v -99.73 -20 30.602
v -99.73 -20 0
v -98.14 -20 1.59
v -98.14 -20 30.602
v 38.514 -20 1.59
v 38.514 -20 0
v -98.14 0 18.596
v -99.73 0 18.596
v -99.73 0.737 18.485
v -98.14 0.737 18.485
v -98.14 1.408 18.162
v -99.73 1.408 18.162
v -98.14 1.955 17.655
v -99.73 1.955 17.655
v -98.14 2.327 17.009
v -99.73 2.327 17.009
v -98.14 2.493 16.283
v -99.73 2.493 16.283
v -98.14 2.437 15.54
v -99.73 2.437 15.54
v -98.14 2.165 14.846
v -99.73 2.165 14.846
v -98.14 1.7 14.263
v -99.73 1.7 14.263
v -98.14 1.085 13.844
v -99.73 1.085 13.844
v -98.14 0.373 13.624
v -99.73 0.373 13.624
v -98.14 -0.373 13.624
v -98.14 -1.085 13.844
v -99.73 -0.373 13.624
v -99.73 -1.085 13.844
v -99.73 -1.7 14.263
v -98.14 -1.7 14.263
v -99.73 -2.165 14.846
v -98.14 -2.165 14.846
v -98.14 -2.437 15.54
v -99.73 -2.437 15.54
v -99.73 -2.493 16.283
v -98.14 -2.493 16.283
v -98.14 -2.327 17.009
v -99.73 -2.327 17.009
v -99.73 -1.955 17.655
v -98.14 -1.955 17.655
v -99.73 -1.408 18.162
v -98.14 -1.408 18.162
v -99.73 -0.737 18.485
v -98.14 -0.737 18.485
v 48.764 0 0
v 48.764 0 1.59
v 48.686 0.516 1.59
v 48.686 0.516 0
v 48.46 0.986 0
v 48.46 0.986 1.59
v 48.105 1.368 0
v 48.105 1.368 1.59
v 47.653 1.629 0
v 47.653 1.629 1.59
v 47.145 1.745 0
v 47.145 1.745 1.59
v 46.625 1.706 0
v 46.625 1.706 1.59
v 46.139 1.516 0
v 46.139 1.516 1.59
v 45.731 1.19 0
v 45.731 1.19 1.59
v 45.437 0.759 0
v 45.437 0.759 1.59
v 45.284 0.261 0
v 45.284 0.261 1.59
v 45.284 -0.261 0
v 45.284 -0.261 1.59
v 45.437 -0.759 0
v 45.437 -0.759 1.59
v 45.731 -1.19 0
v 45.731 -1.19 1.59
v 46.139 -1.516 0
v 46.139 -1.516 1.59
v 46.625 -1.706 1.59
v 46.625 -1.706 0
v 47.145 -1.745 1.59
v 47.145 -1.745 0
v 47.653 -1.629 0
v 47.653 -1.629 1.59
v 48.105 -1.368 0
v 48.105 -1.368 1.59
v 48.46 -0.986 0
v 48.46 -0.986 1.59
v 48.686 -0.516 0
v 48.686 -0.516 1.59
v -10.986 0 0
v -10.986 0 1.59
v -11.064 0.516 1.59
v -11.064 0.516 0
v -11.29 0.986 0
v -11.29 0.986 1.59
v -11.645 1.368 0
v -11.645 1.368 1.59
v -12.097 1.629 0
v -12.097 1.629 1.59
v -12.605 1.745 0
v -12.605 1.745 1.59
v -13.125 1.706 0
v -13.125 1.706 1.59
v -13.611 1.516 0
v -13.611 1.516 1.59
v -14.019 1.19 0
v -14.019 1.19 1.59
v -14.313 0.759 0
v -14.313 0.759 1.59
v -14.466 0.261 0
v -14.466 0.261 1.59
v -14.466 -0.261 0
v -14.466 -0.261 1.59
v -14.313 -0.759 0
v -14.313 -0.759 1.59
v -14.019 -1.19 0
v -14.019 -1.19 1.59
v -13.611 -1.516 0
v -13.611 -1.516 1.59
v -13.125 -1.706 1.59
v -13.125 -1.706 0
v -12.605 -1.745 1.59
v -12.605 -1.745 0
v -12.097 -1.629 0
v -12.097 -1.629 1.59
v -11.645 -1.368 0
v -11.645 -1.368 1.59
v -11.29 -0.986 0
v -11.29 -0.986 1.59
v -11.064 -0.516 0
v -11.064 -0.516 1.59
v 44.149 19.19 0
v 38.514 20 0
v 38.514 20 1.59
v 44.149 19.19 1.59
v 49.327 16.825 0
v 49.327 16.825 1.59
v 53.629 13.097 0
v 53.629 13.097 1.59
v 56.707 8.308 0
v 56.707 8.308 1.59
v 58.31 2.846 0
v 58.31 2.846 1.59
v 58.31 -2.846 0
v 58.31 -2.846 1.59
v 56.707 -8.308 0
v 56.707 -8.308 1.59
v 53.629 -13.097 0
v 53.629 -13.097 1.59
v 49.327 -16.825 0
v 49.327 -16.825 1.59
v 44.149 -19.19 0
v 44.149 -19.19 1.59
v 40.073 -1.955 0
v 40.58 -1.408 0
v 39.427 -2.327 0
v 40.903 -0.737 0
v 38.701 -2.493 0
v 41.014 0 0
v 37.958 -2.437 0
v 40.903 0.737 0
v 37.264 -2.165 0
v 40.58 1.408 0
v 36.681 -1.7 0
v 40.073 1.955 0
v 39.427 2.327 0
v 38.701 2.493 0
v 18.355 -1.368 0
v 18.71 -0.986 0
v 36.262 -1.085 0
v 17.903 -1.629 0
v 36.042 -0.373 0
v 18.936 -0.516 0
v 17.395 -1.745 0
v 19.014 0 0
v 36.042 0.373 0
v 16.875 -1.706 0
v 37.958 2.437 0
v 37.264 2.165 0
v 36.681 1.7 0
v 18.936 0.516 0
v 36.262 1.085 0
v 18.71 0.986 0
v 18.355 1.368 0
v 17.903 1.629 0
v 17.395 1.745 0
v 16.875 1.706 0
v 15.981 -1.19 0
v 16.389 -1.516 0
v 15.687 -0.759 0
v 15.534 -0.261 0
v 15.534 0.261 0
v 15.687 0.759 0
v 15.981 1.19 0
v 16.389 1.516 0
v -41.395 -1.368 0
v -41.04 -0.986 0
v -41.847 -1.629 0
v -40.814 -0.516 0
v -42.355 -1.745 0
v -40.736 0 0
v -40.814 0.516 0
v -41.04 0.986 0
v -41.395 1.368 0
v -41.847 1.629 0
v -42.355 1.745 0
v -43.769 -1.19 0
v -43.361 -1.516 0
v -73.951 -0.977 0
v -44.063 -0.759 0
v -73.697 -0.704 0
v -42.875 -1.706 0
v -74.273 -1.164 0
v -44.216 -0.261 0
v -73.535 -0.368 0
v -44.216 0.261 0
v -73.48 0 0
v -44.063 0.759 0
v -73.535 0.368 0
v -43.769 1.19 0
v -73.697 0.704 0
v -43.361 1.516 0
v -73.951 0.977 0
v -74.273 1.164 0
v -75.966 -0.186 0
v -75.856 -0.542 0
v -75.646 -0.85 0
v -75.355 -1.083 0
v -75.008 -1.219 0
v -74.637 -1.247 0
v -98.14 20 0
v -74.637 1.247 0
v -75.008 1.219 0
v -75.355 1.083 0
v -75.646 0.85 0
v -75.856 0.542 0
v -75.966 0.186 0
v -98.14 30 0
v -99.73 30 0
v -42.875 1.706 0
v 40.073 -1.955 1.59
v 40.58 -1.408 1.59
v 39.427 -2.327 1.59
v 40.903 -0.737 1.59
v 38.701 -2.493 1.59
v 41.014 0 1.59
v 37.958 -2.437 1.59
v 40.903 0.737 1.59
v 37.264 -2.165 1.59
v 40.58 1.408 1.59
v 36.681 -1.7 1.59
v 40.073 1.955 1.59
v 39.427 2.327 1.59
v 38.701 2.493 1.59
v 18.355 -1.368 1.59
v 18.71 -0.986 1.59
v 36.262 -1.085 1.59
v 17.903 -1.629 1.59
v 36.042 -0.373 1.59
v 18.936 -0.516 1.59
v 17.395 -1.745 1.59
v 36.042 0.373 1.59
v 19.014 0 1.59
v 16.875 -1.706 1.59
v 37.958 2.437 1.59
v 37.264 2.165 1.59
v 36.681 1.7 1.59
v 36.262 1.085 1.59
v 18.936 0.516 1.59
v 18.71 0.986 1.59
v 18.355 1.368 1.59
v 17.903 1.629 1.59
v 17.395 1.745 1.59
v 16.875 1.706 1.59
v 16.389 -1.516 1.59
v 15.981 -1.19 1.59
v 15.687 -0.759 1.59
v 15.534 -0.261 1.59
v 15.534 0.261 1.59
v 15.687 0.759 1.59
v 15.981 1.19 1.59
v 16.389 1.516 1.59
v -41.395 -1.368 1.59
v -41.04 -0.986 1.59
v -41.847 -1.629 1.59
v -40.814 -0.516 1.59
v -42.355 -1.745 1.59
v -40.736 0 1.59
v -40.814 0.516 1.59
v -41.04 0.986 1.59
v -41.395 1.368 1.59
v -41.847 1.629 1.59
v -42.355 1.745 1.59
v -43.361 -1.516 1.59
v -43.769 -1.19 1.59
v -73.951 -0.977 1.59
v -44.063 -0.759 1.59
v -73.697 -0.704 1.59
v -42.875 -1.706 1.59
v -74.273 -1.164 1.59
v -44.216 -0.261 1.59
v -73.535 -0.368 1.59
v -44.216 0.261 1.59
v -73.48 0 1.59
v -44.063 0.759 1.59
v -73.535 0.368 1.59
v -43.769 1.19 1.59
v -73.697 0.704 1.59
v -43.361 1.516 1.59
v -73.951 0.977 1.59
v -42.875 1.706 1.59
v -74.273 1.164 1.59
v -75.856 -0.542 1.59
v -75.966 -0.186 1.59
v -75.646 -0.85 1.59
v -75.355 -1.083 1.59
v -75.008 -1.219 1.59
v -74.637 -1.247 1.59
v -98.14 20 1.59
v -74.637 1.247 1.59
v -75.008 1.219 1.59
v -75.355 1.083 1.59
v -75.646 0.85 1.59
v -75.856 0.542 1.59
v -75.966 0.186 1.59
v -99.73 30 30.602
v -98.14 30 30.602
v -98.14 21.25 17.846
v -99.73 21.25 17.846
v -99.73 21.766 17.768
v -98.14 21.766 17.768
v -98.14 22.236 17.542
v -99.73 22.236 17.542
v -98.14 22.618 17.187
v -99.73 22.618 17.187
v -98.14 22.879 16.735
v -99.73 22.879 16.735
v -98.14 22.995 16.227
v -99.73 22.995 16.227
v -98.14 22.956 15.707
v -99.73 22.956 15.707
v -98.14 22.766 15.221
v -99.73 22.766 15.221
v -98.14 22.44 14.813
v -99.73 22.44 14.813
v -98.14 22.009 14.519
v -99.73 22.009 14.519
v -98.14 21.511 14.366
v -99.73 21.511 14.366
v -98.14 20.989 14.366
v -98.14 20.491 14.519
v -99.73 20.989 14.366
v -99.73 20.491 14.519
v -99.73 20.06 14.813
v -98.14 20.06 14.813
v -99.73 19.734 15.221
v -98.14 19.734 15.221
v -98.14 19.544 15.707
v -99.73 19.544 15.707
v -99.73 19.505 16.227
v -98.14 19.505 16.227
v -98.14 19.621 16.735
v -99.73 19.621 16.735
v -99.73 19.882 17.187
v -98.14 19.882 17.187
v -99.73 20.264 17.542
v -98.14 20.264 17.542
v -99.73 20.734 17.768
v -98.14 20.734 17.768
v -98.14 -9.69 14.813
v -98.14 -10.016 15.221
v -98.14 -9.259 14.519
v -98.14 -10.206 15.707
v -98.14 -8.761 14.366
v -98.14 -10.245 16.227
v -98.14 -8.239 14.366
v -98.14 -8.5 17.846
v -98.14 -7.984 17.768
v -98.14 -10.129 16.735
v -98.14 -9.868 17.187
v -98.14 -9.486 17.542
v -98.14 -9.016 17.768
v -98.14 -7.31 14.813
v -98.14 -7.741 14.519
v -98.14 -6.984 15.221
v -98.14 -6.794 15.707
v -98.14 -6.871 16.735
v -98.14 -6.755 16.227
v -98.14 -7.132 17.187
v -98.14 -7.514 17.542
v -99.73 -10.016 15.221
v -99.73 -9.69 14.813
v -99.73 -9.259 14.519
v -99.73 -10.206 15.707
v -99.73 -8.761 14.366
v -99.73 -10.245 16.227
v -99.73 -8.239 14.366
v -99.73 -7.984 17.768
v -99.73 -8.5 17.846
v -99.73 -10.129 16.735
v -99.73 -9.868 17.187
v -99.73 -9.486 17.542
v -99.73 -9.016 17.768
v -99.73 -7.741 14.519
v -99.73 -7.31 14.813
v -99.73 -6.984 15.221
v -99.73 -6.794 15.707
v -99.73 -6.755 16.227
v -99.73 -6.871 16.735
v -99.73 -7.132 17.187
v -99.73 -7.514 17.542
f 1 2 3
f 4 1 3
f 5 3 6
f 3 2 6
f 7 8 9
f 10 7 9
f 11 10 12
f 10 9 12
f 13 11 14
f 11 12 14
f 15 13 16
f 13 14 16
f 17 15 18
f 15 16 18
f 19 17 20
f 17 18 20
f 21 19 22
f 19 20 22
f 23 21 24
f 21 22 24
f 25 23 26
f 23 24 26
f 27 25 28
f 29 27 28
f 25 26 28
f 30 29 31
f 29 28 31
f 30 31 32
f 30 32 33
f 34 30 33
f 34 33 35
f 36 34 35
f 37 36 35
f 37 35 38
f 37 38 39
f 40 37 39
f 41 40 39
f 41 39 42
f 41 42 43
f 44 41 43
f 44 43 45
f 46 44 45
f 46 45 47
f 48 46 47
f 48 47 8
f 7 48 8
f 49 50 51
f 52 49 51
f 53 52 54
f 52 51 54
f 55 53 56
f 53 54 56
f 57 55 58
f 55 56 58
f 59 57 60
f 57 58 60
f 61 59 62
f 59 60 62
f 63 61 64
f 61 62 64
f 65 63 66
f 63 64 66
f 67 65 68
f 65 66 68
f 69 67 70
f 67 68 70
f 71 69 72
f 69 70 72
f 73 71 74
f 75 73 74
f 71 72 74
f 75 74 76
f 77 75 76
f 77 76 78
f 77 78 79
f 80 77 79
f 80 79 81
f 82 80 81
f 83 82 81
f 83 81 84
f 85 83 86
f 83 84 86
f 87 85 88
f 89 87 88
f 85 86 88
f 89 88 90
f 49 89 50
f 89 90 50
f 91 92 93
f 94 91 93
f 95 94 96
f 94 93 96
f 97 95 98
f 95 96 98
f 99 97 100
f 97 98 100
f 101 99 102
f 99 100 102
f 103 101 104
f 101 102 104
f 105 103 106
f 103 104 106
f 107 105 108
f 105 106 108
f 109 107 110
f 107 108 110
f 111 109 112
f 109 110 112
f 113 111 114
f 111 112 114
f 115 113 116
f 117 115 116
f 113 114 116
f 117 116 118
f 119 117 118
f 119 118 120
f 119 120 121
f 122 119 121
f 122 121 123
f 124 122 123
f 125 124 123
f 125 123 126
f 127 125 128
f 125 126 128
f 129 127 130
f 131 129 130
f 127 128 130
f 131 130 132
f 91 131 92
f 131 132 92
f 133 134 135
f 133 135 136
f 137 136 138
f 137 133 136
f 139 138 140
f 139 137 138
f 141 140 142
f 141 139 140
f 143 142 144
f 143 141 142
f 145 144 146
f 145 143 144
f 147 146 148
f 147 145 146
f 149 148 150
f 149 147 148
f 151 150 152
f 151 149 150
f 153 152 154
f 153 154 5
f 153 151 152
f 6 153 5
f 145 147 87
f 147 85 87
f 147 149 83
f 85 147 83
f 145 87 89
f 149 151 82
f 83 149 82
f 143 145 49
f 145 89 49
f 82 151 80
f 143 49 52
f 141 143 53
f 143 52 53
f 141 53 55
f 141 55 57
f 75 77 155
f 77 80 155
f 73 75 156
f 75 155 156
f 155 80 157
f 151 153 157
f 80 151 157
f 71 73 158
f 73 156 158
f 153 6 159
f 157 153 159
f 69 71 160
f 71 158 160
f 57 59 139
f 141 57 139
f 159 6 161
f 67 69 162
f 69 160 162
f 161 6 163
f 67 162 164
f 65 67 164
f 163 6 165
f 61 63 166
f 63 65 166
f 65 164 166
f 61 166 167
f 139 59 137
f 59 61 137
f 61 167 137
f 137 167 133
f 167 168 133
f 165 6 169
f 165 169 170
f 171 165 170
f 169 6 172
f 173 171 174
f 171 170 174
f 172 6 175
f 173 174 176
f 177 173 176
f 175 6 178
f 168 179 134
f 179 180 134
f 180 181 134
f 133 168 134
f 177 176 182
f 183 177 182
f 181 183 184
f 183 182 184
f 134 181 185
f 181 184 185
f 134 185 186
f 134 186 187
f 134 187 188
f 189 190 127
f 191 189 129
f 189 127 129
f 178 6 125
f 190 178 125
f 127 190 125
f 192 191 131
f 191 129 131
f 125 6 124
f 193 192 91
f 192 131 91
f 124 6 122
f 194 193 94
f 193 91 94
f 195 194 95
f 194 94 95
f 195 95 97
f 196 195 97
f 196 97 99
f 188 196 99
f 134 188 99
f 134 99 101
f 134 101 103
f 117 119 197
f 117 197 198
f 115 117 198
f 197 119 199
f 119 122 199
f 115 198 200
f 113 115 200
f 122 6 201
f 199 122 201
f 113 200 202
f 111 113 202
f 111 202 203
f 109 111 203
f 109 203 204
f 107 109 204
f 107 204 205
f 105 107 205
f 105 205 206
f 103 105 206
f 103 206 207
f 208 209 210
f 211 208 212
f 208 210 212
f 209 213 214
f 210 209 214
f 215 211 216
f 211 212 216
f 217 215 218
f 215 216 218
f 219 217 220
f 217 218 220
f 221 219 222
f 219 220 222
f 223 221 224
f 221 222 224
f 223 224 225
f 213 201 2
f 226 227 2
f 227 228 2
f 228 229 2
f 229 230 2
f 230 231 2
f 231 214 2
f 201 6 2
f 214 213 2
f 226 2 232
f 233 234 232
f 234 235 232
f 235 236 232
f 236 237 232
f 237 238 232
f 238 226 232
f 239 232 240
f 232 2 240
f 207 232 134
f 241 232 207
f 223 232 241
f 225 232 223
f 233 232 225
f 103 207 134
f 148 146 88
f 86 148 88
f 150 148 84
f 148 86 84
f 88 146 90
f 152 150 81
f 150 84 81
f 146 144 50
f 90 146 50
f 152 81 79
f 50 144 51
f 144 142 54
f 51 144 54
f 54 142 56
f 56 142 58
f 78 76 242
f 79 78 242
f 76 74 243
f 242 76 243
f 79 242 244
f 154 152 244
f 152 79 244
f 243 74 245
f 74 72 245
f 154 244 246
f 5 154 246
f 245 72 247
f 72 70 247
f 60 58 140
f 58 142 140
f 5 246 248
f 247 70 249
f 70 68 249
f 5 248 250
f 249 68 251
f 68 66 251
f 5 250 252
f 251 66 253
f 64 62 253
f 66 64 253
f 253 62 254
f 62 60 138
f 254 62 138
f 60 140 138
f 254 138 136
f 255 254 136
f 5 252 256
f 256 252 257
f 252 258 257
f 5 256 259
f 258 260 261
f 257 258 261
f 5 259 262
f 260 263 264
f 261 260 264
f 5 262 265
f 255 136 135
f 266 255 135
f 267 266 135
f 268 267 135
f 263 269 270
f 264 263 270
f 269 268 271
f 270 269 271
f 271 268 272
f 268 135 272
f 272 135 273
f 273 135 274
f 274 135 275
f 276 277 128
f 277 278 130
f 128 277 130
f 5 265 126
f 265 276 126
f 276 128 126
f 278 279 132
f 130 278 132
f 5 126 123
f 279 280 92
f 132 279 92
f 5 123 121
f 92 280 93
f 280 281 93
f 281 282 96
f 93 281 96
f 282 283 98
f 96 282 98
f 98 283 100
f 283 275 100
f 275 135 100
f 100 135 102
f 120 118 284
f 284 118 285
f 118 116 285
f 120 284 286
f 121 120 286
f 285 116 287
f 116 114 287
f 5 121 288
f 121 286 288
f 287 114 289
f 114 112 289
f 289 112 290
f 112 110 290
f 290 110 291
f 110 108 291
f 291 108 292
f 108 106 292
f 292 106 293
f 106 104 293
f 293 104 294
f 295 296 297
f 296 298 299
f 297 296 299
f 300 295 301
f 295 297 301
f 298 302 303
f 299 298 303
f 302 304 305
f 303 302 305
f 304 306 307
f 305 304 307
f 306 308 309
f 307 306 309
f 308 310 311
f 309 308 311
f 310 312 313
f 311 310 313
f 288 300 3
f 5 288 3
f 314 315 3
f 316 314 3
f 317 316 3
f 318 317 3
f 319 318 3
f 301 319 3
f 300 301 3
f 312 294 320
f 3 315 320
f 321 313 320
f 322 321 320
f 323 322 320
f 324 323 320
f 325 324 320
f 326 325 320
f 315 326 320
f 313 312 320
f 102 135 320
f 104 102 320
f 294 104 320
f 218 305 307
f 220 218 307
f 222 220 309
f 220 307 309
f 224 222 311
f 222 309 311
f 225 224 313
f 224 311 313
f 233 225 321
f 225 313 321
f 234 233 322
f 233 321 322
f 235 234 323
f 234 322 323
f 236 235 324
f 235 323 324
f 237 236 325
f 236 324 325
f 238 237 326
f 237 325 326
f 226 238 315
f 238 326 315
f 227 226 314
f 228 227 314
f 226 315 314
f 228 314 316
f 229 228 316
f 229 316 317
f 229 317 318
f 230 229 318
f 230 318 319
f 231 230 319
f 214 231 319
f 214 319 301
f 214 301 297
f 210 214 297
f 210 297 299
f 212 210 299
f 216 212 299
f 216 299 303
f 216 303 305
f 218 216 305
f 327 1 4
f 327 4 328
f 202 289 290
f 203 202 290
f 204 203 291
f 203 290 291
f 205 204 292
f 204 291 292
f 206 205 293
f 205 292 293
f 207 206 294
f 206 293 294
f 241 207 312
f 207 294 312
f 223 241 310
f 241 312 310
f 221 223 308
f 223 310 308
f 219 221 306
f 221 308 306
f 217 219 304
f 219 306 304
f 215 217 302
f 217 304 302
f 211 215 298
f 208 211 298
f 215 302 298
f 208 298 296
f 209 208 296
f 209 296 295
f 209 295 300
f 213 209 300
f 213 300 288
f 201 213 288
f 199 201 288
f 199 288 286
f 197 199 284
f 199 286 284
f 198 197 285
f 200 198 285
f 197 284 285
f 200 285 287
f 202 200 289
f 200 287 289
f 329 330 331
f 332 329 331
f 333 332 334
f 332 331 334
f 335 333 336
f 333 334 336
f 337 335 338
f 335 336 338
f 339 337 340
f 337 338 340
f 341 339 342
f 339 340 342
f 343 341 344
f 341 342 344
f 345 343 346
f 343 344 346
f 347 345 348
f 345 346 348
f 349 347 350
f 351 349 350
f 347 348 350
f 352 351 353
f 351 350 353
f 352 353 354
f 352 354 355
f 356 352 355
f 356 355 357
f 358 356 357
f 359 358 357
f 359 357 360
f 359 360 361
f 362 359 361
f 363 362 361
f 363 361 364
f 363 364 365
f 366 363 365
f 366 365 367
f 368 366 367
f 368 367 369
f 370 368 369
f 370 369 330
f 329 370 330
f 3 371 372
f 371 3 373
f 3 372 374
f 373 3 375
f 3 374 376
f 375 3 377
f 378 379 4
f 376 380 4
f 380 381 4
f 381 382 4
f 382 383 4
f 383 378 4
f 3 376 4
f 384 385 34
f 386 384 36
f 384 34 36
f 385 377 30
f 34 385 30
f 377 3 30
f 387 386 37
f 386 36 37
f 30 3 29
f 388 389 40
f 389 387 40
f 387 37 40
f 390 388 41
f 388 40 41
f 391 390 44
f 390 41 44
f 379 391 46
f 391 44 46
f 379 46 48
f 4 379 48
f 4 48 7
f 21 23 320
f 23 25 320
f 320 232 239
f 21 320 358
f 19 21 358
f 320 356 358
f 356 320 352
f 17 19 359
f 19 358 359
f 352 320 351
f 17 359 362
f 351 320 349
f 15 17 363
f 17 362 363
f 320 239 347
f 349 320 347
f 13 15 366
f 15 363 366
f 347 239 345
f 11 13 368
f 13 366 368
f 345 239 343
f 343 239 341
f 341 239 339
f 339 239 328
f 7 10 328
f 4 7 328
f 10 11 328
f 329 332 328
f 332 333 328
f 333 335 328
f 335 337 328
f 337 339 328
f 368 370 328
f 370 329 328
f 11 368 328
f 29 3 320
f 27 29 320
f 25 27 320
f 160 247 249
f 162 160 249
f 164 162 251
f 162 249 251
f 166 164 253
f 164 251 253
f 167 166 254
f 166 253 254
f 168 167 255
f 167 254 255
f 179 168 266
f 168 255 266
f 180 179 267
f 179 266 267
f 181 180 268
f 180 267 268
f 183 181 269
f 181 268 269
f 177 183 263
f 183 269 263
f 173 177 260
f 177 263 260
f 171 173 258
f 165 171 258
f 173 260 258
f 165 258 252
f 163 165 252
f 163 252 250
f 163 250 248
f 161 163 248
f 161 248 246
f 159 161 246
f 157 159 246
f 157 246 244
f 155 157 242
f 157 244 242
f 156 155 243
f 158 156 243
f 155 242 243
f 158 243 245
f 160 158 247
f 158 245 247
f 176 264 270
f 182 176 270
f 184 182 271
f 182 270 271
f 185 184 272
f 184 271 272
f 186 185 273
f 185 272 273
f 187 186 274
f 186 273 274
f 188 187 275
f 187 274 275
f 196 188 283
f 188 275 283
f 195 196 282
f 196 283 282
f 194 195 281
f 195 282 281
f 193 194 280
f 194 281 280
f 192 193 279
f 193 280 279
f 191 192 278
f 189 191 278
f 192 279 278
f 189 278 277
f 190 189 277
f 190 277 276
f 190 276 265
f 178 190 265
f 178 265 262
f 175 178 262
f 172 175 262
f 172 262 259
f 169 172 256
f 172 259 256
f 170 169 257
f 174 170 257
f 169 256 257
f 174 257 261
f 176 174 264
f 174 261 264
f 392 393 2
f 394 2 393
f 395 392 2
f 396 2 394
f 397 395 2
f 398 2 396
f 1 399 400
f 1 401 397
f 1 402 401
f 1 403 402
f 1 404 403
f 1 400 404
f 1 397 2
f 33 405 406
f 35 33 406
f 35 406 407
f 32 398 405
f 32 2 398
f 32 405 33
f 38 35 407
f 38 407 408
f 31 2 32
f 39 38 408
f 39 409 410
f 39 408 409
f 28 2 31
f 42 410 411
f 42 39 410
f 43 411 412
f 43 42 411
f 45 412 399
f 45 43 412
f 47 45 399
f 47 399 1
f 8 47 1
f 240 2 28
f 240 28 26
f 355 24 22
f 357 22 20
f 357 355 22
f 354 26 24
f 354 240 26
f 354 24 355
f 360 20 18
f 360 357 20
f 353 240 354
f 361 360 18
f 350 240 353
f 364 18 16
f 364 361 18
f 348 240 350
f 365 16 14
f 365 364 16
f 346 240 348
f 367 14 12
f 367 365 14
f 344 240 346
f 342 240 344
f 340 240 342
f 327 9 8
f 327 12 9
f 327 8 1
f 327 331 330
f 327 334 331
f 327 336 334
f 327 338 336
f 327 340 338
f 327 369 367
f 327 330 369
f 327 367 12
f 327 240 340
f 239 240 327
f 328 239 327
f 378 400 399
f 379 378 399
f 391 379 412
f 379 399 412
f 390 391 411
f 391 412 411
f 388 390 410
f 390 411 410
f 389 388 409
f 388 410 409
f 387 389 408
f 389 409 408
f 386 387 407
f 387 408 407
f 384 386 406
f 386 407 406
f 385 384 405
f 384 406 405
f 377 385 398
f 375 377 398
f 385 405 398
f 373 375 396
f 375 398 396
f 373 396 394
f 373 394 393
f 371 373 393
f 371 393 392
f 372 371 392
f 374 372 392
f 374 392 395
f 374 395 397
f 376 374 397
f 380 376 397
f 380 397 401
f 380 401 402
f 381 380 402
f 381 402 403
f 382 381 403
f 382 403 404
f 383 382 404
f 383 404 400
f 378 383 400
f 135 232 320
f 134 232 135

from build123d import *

# Parameters (mm, degrees)
BOSS_EXTRUDE1_DEPTH = 1.59
SKETCH2_R           = 2.5
SKETCH2_R_2         = 1.75
CUT_EXTRUDE2_DEPTH  = 1.59
SKETCH3_W           = 1.59
SKETCH3_H           = 40
BOSS_EXTRUDE2_DEPTH = 30.602
SKETCH5_W           = 1.59
SKETCH5_H           = 40
CUT_EXTRUDE4_DEPTH  = 10
SKETCH9_W           = 30.602
SKETCH9_H           = 10
BOSS_EXTRUDE4_DEPTH = 1.59
SKETCH10_R          = 1.75
SKETCH10_R_2        = 2.5
CUT_EXTRUDE6_DEPTH  = 10
SKETCH11_R          = 1.25
CUT_EXTRUDE7_DEPTH  = 10


with BuildPart() as part:
    # Sketch1 → Boss-Extrude1 (new body)
    with BuildSketch(Plane.XY):
        with BuildLine():
            Line((-38.514035237, 20), (38.514035237, 20))
            ThreePointArc((38.514035237, 20), (58.514035237, 0), (38.514035237, -20))
            Line((38.514035237, -20), (-38.514035237, -20))
            Line((-38.514035237, -20), (-99.729964763, -20))
            Line((-99.729964763, -20), (-99.729964763, 20))
            Line((-99.729964763, 20), (-38.514035237, 20))
        make_face()
    extrude(amount=BOSS_EXTRUDE1_DEPTH)

    # Sketch2 → Cut-Extrude2 (cut)
    with BuildSketch(Plane.XY.offset(1.59)):
        with Locations((38.514035237, 0)):
            Circle(SKETCH2_R)
        with Locations((47.014035237, 0)):
            Circle(SKETCH2_R_2)
        with Locations((17.264035237, 0)):
            Circle(SKETCH2_R_2)
        with Locations((-12.735964763, 0)):
            Circle(SKETCH2_R_2)
        with Locations((-42.485964763, 0)):
            Circle(SKETCH2_R_2)
    extrude(amount=-CUT_EXTRUDE2_DEPTH, mode=Mode.SUBTRACT)

    # Sketch3 → Boss-Extrude2 (add)
    with BuildSketch(Plane.XY.offset(1.59)):
        with Locations((-98.934964763, 0)):
            Rectangle(SKETCH3_W, SKETCH3_H)
    extrude(amount=BOSS_EXTRUDE2_DEPTH)

    # Sketch5 → Cut-Extrude4 (cut)
    with BuildSketch(Plane.ZY.offset(99.729964763)):
        with Locations((31.397, 0)):
            Rectangle(SKETCH5_W, SKETCH5_H)
    extrude(amount=-CUT_EXTRUDE4_DEPTH, mode=Mode.SUBTRACT)

    # Sketch9 → Boss-Extrude4 (add)
    with BuildSketch(Plane.ZY.offset(99.729964763)):
        with Locations((15.301, 25)):
            Rectangle(SKETCH9_W, SKETCH9_H)
    extrude(amount=-BOSS_EXTRUDE4_DEPTH)

    # Sketch10 → Cut-Extrude6 (cut)
    with BuildSketch(Plane.ZY.offset(99.729964763)):
        with Locations((16.096, -8.5)):
            Circle(SKETCH10_R)
        with Locations((16.096, 0)):
            Circle(SKETCH10_R_2)
        with Locations((16.096, 21.25)):
            Circle(SKETCH10_R)
    extrude(amount=-CUT_EXTRUDE6_DEPTH, mode=Mode.SUBTRACT)

    # Sketch11 → Cut-Extrude7 (cut)
    with BuildSketch(Plane.XY.offset(1.59)):
        with Locations((-74.729964763, 0)):
            Circle(SKETCH11_R)
    extrude(amount=-CUT_EXTRUDE7_DEPTH, mode=Mode.SUBTRACT)


solid = part.part
